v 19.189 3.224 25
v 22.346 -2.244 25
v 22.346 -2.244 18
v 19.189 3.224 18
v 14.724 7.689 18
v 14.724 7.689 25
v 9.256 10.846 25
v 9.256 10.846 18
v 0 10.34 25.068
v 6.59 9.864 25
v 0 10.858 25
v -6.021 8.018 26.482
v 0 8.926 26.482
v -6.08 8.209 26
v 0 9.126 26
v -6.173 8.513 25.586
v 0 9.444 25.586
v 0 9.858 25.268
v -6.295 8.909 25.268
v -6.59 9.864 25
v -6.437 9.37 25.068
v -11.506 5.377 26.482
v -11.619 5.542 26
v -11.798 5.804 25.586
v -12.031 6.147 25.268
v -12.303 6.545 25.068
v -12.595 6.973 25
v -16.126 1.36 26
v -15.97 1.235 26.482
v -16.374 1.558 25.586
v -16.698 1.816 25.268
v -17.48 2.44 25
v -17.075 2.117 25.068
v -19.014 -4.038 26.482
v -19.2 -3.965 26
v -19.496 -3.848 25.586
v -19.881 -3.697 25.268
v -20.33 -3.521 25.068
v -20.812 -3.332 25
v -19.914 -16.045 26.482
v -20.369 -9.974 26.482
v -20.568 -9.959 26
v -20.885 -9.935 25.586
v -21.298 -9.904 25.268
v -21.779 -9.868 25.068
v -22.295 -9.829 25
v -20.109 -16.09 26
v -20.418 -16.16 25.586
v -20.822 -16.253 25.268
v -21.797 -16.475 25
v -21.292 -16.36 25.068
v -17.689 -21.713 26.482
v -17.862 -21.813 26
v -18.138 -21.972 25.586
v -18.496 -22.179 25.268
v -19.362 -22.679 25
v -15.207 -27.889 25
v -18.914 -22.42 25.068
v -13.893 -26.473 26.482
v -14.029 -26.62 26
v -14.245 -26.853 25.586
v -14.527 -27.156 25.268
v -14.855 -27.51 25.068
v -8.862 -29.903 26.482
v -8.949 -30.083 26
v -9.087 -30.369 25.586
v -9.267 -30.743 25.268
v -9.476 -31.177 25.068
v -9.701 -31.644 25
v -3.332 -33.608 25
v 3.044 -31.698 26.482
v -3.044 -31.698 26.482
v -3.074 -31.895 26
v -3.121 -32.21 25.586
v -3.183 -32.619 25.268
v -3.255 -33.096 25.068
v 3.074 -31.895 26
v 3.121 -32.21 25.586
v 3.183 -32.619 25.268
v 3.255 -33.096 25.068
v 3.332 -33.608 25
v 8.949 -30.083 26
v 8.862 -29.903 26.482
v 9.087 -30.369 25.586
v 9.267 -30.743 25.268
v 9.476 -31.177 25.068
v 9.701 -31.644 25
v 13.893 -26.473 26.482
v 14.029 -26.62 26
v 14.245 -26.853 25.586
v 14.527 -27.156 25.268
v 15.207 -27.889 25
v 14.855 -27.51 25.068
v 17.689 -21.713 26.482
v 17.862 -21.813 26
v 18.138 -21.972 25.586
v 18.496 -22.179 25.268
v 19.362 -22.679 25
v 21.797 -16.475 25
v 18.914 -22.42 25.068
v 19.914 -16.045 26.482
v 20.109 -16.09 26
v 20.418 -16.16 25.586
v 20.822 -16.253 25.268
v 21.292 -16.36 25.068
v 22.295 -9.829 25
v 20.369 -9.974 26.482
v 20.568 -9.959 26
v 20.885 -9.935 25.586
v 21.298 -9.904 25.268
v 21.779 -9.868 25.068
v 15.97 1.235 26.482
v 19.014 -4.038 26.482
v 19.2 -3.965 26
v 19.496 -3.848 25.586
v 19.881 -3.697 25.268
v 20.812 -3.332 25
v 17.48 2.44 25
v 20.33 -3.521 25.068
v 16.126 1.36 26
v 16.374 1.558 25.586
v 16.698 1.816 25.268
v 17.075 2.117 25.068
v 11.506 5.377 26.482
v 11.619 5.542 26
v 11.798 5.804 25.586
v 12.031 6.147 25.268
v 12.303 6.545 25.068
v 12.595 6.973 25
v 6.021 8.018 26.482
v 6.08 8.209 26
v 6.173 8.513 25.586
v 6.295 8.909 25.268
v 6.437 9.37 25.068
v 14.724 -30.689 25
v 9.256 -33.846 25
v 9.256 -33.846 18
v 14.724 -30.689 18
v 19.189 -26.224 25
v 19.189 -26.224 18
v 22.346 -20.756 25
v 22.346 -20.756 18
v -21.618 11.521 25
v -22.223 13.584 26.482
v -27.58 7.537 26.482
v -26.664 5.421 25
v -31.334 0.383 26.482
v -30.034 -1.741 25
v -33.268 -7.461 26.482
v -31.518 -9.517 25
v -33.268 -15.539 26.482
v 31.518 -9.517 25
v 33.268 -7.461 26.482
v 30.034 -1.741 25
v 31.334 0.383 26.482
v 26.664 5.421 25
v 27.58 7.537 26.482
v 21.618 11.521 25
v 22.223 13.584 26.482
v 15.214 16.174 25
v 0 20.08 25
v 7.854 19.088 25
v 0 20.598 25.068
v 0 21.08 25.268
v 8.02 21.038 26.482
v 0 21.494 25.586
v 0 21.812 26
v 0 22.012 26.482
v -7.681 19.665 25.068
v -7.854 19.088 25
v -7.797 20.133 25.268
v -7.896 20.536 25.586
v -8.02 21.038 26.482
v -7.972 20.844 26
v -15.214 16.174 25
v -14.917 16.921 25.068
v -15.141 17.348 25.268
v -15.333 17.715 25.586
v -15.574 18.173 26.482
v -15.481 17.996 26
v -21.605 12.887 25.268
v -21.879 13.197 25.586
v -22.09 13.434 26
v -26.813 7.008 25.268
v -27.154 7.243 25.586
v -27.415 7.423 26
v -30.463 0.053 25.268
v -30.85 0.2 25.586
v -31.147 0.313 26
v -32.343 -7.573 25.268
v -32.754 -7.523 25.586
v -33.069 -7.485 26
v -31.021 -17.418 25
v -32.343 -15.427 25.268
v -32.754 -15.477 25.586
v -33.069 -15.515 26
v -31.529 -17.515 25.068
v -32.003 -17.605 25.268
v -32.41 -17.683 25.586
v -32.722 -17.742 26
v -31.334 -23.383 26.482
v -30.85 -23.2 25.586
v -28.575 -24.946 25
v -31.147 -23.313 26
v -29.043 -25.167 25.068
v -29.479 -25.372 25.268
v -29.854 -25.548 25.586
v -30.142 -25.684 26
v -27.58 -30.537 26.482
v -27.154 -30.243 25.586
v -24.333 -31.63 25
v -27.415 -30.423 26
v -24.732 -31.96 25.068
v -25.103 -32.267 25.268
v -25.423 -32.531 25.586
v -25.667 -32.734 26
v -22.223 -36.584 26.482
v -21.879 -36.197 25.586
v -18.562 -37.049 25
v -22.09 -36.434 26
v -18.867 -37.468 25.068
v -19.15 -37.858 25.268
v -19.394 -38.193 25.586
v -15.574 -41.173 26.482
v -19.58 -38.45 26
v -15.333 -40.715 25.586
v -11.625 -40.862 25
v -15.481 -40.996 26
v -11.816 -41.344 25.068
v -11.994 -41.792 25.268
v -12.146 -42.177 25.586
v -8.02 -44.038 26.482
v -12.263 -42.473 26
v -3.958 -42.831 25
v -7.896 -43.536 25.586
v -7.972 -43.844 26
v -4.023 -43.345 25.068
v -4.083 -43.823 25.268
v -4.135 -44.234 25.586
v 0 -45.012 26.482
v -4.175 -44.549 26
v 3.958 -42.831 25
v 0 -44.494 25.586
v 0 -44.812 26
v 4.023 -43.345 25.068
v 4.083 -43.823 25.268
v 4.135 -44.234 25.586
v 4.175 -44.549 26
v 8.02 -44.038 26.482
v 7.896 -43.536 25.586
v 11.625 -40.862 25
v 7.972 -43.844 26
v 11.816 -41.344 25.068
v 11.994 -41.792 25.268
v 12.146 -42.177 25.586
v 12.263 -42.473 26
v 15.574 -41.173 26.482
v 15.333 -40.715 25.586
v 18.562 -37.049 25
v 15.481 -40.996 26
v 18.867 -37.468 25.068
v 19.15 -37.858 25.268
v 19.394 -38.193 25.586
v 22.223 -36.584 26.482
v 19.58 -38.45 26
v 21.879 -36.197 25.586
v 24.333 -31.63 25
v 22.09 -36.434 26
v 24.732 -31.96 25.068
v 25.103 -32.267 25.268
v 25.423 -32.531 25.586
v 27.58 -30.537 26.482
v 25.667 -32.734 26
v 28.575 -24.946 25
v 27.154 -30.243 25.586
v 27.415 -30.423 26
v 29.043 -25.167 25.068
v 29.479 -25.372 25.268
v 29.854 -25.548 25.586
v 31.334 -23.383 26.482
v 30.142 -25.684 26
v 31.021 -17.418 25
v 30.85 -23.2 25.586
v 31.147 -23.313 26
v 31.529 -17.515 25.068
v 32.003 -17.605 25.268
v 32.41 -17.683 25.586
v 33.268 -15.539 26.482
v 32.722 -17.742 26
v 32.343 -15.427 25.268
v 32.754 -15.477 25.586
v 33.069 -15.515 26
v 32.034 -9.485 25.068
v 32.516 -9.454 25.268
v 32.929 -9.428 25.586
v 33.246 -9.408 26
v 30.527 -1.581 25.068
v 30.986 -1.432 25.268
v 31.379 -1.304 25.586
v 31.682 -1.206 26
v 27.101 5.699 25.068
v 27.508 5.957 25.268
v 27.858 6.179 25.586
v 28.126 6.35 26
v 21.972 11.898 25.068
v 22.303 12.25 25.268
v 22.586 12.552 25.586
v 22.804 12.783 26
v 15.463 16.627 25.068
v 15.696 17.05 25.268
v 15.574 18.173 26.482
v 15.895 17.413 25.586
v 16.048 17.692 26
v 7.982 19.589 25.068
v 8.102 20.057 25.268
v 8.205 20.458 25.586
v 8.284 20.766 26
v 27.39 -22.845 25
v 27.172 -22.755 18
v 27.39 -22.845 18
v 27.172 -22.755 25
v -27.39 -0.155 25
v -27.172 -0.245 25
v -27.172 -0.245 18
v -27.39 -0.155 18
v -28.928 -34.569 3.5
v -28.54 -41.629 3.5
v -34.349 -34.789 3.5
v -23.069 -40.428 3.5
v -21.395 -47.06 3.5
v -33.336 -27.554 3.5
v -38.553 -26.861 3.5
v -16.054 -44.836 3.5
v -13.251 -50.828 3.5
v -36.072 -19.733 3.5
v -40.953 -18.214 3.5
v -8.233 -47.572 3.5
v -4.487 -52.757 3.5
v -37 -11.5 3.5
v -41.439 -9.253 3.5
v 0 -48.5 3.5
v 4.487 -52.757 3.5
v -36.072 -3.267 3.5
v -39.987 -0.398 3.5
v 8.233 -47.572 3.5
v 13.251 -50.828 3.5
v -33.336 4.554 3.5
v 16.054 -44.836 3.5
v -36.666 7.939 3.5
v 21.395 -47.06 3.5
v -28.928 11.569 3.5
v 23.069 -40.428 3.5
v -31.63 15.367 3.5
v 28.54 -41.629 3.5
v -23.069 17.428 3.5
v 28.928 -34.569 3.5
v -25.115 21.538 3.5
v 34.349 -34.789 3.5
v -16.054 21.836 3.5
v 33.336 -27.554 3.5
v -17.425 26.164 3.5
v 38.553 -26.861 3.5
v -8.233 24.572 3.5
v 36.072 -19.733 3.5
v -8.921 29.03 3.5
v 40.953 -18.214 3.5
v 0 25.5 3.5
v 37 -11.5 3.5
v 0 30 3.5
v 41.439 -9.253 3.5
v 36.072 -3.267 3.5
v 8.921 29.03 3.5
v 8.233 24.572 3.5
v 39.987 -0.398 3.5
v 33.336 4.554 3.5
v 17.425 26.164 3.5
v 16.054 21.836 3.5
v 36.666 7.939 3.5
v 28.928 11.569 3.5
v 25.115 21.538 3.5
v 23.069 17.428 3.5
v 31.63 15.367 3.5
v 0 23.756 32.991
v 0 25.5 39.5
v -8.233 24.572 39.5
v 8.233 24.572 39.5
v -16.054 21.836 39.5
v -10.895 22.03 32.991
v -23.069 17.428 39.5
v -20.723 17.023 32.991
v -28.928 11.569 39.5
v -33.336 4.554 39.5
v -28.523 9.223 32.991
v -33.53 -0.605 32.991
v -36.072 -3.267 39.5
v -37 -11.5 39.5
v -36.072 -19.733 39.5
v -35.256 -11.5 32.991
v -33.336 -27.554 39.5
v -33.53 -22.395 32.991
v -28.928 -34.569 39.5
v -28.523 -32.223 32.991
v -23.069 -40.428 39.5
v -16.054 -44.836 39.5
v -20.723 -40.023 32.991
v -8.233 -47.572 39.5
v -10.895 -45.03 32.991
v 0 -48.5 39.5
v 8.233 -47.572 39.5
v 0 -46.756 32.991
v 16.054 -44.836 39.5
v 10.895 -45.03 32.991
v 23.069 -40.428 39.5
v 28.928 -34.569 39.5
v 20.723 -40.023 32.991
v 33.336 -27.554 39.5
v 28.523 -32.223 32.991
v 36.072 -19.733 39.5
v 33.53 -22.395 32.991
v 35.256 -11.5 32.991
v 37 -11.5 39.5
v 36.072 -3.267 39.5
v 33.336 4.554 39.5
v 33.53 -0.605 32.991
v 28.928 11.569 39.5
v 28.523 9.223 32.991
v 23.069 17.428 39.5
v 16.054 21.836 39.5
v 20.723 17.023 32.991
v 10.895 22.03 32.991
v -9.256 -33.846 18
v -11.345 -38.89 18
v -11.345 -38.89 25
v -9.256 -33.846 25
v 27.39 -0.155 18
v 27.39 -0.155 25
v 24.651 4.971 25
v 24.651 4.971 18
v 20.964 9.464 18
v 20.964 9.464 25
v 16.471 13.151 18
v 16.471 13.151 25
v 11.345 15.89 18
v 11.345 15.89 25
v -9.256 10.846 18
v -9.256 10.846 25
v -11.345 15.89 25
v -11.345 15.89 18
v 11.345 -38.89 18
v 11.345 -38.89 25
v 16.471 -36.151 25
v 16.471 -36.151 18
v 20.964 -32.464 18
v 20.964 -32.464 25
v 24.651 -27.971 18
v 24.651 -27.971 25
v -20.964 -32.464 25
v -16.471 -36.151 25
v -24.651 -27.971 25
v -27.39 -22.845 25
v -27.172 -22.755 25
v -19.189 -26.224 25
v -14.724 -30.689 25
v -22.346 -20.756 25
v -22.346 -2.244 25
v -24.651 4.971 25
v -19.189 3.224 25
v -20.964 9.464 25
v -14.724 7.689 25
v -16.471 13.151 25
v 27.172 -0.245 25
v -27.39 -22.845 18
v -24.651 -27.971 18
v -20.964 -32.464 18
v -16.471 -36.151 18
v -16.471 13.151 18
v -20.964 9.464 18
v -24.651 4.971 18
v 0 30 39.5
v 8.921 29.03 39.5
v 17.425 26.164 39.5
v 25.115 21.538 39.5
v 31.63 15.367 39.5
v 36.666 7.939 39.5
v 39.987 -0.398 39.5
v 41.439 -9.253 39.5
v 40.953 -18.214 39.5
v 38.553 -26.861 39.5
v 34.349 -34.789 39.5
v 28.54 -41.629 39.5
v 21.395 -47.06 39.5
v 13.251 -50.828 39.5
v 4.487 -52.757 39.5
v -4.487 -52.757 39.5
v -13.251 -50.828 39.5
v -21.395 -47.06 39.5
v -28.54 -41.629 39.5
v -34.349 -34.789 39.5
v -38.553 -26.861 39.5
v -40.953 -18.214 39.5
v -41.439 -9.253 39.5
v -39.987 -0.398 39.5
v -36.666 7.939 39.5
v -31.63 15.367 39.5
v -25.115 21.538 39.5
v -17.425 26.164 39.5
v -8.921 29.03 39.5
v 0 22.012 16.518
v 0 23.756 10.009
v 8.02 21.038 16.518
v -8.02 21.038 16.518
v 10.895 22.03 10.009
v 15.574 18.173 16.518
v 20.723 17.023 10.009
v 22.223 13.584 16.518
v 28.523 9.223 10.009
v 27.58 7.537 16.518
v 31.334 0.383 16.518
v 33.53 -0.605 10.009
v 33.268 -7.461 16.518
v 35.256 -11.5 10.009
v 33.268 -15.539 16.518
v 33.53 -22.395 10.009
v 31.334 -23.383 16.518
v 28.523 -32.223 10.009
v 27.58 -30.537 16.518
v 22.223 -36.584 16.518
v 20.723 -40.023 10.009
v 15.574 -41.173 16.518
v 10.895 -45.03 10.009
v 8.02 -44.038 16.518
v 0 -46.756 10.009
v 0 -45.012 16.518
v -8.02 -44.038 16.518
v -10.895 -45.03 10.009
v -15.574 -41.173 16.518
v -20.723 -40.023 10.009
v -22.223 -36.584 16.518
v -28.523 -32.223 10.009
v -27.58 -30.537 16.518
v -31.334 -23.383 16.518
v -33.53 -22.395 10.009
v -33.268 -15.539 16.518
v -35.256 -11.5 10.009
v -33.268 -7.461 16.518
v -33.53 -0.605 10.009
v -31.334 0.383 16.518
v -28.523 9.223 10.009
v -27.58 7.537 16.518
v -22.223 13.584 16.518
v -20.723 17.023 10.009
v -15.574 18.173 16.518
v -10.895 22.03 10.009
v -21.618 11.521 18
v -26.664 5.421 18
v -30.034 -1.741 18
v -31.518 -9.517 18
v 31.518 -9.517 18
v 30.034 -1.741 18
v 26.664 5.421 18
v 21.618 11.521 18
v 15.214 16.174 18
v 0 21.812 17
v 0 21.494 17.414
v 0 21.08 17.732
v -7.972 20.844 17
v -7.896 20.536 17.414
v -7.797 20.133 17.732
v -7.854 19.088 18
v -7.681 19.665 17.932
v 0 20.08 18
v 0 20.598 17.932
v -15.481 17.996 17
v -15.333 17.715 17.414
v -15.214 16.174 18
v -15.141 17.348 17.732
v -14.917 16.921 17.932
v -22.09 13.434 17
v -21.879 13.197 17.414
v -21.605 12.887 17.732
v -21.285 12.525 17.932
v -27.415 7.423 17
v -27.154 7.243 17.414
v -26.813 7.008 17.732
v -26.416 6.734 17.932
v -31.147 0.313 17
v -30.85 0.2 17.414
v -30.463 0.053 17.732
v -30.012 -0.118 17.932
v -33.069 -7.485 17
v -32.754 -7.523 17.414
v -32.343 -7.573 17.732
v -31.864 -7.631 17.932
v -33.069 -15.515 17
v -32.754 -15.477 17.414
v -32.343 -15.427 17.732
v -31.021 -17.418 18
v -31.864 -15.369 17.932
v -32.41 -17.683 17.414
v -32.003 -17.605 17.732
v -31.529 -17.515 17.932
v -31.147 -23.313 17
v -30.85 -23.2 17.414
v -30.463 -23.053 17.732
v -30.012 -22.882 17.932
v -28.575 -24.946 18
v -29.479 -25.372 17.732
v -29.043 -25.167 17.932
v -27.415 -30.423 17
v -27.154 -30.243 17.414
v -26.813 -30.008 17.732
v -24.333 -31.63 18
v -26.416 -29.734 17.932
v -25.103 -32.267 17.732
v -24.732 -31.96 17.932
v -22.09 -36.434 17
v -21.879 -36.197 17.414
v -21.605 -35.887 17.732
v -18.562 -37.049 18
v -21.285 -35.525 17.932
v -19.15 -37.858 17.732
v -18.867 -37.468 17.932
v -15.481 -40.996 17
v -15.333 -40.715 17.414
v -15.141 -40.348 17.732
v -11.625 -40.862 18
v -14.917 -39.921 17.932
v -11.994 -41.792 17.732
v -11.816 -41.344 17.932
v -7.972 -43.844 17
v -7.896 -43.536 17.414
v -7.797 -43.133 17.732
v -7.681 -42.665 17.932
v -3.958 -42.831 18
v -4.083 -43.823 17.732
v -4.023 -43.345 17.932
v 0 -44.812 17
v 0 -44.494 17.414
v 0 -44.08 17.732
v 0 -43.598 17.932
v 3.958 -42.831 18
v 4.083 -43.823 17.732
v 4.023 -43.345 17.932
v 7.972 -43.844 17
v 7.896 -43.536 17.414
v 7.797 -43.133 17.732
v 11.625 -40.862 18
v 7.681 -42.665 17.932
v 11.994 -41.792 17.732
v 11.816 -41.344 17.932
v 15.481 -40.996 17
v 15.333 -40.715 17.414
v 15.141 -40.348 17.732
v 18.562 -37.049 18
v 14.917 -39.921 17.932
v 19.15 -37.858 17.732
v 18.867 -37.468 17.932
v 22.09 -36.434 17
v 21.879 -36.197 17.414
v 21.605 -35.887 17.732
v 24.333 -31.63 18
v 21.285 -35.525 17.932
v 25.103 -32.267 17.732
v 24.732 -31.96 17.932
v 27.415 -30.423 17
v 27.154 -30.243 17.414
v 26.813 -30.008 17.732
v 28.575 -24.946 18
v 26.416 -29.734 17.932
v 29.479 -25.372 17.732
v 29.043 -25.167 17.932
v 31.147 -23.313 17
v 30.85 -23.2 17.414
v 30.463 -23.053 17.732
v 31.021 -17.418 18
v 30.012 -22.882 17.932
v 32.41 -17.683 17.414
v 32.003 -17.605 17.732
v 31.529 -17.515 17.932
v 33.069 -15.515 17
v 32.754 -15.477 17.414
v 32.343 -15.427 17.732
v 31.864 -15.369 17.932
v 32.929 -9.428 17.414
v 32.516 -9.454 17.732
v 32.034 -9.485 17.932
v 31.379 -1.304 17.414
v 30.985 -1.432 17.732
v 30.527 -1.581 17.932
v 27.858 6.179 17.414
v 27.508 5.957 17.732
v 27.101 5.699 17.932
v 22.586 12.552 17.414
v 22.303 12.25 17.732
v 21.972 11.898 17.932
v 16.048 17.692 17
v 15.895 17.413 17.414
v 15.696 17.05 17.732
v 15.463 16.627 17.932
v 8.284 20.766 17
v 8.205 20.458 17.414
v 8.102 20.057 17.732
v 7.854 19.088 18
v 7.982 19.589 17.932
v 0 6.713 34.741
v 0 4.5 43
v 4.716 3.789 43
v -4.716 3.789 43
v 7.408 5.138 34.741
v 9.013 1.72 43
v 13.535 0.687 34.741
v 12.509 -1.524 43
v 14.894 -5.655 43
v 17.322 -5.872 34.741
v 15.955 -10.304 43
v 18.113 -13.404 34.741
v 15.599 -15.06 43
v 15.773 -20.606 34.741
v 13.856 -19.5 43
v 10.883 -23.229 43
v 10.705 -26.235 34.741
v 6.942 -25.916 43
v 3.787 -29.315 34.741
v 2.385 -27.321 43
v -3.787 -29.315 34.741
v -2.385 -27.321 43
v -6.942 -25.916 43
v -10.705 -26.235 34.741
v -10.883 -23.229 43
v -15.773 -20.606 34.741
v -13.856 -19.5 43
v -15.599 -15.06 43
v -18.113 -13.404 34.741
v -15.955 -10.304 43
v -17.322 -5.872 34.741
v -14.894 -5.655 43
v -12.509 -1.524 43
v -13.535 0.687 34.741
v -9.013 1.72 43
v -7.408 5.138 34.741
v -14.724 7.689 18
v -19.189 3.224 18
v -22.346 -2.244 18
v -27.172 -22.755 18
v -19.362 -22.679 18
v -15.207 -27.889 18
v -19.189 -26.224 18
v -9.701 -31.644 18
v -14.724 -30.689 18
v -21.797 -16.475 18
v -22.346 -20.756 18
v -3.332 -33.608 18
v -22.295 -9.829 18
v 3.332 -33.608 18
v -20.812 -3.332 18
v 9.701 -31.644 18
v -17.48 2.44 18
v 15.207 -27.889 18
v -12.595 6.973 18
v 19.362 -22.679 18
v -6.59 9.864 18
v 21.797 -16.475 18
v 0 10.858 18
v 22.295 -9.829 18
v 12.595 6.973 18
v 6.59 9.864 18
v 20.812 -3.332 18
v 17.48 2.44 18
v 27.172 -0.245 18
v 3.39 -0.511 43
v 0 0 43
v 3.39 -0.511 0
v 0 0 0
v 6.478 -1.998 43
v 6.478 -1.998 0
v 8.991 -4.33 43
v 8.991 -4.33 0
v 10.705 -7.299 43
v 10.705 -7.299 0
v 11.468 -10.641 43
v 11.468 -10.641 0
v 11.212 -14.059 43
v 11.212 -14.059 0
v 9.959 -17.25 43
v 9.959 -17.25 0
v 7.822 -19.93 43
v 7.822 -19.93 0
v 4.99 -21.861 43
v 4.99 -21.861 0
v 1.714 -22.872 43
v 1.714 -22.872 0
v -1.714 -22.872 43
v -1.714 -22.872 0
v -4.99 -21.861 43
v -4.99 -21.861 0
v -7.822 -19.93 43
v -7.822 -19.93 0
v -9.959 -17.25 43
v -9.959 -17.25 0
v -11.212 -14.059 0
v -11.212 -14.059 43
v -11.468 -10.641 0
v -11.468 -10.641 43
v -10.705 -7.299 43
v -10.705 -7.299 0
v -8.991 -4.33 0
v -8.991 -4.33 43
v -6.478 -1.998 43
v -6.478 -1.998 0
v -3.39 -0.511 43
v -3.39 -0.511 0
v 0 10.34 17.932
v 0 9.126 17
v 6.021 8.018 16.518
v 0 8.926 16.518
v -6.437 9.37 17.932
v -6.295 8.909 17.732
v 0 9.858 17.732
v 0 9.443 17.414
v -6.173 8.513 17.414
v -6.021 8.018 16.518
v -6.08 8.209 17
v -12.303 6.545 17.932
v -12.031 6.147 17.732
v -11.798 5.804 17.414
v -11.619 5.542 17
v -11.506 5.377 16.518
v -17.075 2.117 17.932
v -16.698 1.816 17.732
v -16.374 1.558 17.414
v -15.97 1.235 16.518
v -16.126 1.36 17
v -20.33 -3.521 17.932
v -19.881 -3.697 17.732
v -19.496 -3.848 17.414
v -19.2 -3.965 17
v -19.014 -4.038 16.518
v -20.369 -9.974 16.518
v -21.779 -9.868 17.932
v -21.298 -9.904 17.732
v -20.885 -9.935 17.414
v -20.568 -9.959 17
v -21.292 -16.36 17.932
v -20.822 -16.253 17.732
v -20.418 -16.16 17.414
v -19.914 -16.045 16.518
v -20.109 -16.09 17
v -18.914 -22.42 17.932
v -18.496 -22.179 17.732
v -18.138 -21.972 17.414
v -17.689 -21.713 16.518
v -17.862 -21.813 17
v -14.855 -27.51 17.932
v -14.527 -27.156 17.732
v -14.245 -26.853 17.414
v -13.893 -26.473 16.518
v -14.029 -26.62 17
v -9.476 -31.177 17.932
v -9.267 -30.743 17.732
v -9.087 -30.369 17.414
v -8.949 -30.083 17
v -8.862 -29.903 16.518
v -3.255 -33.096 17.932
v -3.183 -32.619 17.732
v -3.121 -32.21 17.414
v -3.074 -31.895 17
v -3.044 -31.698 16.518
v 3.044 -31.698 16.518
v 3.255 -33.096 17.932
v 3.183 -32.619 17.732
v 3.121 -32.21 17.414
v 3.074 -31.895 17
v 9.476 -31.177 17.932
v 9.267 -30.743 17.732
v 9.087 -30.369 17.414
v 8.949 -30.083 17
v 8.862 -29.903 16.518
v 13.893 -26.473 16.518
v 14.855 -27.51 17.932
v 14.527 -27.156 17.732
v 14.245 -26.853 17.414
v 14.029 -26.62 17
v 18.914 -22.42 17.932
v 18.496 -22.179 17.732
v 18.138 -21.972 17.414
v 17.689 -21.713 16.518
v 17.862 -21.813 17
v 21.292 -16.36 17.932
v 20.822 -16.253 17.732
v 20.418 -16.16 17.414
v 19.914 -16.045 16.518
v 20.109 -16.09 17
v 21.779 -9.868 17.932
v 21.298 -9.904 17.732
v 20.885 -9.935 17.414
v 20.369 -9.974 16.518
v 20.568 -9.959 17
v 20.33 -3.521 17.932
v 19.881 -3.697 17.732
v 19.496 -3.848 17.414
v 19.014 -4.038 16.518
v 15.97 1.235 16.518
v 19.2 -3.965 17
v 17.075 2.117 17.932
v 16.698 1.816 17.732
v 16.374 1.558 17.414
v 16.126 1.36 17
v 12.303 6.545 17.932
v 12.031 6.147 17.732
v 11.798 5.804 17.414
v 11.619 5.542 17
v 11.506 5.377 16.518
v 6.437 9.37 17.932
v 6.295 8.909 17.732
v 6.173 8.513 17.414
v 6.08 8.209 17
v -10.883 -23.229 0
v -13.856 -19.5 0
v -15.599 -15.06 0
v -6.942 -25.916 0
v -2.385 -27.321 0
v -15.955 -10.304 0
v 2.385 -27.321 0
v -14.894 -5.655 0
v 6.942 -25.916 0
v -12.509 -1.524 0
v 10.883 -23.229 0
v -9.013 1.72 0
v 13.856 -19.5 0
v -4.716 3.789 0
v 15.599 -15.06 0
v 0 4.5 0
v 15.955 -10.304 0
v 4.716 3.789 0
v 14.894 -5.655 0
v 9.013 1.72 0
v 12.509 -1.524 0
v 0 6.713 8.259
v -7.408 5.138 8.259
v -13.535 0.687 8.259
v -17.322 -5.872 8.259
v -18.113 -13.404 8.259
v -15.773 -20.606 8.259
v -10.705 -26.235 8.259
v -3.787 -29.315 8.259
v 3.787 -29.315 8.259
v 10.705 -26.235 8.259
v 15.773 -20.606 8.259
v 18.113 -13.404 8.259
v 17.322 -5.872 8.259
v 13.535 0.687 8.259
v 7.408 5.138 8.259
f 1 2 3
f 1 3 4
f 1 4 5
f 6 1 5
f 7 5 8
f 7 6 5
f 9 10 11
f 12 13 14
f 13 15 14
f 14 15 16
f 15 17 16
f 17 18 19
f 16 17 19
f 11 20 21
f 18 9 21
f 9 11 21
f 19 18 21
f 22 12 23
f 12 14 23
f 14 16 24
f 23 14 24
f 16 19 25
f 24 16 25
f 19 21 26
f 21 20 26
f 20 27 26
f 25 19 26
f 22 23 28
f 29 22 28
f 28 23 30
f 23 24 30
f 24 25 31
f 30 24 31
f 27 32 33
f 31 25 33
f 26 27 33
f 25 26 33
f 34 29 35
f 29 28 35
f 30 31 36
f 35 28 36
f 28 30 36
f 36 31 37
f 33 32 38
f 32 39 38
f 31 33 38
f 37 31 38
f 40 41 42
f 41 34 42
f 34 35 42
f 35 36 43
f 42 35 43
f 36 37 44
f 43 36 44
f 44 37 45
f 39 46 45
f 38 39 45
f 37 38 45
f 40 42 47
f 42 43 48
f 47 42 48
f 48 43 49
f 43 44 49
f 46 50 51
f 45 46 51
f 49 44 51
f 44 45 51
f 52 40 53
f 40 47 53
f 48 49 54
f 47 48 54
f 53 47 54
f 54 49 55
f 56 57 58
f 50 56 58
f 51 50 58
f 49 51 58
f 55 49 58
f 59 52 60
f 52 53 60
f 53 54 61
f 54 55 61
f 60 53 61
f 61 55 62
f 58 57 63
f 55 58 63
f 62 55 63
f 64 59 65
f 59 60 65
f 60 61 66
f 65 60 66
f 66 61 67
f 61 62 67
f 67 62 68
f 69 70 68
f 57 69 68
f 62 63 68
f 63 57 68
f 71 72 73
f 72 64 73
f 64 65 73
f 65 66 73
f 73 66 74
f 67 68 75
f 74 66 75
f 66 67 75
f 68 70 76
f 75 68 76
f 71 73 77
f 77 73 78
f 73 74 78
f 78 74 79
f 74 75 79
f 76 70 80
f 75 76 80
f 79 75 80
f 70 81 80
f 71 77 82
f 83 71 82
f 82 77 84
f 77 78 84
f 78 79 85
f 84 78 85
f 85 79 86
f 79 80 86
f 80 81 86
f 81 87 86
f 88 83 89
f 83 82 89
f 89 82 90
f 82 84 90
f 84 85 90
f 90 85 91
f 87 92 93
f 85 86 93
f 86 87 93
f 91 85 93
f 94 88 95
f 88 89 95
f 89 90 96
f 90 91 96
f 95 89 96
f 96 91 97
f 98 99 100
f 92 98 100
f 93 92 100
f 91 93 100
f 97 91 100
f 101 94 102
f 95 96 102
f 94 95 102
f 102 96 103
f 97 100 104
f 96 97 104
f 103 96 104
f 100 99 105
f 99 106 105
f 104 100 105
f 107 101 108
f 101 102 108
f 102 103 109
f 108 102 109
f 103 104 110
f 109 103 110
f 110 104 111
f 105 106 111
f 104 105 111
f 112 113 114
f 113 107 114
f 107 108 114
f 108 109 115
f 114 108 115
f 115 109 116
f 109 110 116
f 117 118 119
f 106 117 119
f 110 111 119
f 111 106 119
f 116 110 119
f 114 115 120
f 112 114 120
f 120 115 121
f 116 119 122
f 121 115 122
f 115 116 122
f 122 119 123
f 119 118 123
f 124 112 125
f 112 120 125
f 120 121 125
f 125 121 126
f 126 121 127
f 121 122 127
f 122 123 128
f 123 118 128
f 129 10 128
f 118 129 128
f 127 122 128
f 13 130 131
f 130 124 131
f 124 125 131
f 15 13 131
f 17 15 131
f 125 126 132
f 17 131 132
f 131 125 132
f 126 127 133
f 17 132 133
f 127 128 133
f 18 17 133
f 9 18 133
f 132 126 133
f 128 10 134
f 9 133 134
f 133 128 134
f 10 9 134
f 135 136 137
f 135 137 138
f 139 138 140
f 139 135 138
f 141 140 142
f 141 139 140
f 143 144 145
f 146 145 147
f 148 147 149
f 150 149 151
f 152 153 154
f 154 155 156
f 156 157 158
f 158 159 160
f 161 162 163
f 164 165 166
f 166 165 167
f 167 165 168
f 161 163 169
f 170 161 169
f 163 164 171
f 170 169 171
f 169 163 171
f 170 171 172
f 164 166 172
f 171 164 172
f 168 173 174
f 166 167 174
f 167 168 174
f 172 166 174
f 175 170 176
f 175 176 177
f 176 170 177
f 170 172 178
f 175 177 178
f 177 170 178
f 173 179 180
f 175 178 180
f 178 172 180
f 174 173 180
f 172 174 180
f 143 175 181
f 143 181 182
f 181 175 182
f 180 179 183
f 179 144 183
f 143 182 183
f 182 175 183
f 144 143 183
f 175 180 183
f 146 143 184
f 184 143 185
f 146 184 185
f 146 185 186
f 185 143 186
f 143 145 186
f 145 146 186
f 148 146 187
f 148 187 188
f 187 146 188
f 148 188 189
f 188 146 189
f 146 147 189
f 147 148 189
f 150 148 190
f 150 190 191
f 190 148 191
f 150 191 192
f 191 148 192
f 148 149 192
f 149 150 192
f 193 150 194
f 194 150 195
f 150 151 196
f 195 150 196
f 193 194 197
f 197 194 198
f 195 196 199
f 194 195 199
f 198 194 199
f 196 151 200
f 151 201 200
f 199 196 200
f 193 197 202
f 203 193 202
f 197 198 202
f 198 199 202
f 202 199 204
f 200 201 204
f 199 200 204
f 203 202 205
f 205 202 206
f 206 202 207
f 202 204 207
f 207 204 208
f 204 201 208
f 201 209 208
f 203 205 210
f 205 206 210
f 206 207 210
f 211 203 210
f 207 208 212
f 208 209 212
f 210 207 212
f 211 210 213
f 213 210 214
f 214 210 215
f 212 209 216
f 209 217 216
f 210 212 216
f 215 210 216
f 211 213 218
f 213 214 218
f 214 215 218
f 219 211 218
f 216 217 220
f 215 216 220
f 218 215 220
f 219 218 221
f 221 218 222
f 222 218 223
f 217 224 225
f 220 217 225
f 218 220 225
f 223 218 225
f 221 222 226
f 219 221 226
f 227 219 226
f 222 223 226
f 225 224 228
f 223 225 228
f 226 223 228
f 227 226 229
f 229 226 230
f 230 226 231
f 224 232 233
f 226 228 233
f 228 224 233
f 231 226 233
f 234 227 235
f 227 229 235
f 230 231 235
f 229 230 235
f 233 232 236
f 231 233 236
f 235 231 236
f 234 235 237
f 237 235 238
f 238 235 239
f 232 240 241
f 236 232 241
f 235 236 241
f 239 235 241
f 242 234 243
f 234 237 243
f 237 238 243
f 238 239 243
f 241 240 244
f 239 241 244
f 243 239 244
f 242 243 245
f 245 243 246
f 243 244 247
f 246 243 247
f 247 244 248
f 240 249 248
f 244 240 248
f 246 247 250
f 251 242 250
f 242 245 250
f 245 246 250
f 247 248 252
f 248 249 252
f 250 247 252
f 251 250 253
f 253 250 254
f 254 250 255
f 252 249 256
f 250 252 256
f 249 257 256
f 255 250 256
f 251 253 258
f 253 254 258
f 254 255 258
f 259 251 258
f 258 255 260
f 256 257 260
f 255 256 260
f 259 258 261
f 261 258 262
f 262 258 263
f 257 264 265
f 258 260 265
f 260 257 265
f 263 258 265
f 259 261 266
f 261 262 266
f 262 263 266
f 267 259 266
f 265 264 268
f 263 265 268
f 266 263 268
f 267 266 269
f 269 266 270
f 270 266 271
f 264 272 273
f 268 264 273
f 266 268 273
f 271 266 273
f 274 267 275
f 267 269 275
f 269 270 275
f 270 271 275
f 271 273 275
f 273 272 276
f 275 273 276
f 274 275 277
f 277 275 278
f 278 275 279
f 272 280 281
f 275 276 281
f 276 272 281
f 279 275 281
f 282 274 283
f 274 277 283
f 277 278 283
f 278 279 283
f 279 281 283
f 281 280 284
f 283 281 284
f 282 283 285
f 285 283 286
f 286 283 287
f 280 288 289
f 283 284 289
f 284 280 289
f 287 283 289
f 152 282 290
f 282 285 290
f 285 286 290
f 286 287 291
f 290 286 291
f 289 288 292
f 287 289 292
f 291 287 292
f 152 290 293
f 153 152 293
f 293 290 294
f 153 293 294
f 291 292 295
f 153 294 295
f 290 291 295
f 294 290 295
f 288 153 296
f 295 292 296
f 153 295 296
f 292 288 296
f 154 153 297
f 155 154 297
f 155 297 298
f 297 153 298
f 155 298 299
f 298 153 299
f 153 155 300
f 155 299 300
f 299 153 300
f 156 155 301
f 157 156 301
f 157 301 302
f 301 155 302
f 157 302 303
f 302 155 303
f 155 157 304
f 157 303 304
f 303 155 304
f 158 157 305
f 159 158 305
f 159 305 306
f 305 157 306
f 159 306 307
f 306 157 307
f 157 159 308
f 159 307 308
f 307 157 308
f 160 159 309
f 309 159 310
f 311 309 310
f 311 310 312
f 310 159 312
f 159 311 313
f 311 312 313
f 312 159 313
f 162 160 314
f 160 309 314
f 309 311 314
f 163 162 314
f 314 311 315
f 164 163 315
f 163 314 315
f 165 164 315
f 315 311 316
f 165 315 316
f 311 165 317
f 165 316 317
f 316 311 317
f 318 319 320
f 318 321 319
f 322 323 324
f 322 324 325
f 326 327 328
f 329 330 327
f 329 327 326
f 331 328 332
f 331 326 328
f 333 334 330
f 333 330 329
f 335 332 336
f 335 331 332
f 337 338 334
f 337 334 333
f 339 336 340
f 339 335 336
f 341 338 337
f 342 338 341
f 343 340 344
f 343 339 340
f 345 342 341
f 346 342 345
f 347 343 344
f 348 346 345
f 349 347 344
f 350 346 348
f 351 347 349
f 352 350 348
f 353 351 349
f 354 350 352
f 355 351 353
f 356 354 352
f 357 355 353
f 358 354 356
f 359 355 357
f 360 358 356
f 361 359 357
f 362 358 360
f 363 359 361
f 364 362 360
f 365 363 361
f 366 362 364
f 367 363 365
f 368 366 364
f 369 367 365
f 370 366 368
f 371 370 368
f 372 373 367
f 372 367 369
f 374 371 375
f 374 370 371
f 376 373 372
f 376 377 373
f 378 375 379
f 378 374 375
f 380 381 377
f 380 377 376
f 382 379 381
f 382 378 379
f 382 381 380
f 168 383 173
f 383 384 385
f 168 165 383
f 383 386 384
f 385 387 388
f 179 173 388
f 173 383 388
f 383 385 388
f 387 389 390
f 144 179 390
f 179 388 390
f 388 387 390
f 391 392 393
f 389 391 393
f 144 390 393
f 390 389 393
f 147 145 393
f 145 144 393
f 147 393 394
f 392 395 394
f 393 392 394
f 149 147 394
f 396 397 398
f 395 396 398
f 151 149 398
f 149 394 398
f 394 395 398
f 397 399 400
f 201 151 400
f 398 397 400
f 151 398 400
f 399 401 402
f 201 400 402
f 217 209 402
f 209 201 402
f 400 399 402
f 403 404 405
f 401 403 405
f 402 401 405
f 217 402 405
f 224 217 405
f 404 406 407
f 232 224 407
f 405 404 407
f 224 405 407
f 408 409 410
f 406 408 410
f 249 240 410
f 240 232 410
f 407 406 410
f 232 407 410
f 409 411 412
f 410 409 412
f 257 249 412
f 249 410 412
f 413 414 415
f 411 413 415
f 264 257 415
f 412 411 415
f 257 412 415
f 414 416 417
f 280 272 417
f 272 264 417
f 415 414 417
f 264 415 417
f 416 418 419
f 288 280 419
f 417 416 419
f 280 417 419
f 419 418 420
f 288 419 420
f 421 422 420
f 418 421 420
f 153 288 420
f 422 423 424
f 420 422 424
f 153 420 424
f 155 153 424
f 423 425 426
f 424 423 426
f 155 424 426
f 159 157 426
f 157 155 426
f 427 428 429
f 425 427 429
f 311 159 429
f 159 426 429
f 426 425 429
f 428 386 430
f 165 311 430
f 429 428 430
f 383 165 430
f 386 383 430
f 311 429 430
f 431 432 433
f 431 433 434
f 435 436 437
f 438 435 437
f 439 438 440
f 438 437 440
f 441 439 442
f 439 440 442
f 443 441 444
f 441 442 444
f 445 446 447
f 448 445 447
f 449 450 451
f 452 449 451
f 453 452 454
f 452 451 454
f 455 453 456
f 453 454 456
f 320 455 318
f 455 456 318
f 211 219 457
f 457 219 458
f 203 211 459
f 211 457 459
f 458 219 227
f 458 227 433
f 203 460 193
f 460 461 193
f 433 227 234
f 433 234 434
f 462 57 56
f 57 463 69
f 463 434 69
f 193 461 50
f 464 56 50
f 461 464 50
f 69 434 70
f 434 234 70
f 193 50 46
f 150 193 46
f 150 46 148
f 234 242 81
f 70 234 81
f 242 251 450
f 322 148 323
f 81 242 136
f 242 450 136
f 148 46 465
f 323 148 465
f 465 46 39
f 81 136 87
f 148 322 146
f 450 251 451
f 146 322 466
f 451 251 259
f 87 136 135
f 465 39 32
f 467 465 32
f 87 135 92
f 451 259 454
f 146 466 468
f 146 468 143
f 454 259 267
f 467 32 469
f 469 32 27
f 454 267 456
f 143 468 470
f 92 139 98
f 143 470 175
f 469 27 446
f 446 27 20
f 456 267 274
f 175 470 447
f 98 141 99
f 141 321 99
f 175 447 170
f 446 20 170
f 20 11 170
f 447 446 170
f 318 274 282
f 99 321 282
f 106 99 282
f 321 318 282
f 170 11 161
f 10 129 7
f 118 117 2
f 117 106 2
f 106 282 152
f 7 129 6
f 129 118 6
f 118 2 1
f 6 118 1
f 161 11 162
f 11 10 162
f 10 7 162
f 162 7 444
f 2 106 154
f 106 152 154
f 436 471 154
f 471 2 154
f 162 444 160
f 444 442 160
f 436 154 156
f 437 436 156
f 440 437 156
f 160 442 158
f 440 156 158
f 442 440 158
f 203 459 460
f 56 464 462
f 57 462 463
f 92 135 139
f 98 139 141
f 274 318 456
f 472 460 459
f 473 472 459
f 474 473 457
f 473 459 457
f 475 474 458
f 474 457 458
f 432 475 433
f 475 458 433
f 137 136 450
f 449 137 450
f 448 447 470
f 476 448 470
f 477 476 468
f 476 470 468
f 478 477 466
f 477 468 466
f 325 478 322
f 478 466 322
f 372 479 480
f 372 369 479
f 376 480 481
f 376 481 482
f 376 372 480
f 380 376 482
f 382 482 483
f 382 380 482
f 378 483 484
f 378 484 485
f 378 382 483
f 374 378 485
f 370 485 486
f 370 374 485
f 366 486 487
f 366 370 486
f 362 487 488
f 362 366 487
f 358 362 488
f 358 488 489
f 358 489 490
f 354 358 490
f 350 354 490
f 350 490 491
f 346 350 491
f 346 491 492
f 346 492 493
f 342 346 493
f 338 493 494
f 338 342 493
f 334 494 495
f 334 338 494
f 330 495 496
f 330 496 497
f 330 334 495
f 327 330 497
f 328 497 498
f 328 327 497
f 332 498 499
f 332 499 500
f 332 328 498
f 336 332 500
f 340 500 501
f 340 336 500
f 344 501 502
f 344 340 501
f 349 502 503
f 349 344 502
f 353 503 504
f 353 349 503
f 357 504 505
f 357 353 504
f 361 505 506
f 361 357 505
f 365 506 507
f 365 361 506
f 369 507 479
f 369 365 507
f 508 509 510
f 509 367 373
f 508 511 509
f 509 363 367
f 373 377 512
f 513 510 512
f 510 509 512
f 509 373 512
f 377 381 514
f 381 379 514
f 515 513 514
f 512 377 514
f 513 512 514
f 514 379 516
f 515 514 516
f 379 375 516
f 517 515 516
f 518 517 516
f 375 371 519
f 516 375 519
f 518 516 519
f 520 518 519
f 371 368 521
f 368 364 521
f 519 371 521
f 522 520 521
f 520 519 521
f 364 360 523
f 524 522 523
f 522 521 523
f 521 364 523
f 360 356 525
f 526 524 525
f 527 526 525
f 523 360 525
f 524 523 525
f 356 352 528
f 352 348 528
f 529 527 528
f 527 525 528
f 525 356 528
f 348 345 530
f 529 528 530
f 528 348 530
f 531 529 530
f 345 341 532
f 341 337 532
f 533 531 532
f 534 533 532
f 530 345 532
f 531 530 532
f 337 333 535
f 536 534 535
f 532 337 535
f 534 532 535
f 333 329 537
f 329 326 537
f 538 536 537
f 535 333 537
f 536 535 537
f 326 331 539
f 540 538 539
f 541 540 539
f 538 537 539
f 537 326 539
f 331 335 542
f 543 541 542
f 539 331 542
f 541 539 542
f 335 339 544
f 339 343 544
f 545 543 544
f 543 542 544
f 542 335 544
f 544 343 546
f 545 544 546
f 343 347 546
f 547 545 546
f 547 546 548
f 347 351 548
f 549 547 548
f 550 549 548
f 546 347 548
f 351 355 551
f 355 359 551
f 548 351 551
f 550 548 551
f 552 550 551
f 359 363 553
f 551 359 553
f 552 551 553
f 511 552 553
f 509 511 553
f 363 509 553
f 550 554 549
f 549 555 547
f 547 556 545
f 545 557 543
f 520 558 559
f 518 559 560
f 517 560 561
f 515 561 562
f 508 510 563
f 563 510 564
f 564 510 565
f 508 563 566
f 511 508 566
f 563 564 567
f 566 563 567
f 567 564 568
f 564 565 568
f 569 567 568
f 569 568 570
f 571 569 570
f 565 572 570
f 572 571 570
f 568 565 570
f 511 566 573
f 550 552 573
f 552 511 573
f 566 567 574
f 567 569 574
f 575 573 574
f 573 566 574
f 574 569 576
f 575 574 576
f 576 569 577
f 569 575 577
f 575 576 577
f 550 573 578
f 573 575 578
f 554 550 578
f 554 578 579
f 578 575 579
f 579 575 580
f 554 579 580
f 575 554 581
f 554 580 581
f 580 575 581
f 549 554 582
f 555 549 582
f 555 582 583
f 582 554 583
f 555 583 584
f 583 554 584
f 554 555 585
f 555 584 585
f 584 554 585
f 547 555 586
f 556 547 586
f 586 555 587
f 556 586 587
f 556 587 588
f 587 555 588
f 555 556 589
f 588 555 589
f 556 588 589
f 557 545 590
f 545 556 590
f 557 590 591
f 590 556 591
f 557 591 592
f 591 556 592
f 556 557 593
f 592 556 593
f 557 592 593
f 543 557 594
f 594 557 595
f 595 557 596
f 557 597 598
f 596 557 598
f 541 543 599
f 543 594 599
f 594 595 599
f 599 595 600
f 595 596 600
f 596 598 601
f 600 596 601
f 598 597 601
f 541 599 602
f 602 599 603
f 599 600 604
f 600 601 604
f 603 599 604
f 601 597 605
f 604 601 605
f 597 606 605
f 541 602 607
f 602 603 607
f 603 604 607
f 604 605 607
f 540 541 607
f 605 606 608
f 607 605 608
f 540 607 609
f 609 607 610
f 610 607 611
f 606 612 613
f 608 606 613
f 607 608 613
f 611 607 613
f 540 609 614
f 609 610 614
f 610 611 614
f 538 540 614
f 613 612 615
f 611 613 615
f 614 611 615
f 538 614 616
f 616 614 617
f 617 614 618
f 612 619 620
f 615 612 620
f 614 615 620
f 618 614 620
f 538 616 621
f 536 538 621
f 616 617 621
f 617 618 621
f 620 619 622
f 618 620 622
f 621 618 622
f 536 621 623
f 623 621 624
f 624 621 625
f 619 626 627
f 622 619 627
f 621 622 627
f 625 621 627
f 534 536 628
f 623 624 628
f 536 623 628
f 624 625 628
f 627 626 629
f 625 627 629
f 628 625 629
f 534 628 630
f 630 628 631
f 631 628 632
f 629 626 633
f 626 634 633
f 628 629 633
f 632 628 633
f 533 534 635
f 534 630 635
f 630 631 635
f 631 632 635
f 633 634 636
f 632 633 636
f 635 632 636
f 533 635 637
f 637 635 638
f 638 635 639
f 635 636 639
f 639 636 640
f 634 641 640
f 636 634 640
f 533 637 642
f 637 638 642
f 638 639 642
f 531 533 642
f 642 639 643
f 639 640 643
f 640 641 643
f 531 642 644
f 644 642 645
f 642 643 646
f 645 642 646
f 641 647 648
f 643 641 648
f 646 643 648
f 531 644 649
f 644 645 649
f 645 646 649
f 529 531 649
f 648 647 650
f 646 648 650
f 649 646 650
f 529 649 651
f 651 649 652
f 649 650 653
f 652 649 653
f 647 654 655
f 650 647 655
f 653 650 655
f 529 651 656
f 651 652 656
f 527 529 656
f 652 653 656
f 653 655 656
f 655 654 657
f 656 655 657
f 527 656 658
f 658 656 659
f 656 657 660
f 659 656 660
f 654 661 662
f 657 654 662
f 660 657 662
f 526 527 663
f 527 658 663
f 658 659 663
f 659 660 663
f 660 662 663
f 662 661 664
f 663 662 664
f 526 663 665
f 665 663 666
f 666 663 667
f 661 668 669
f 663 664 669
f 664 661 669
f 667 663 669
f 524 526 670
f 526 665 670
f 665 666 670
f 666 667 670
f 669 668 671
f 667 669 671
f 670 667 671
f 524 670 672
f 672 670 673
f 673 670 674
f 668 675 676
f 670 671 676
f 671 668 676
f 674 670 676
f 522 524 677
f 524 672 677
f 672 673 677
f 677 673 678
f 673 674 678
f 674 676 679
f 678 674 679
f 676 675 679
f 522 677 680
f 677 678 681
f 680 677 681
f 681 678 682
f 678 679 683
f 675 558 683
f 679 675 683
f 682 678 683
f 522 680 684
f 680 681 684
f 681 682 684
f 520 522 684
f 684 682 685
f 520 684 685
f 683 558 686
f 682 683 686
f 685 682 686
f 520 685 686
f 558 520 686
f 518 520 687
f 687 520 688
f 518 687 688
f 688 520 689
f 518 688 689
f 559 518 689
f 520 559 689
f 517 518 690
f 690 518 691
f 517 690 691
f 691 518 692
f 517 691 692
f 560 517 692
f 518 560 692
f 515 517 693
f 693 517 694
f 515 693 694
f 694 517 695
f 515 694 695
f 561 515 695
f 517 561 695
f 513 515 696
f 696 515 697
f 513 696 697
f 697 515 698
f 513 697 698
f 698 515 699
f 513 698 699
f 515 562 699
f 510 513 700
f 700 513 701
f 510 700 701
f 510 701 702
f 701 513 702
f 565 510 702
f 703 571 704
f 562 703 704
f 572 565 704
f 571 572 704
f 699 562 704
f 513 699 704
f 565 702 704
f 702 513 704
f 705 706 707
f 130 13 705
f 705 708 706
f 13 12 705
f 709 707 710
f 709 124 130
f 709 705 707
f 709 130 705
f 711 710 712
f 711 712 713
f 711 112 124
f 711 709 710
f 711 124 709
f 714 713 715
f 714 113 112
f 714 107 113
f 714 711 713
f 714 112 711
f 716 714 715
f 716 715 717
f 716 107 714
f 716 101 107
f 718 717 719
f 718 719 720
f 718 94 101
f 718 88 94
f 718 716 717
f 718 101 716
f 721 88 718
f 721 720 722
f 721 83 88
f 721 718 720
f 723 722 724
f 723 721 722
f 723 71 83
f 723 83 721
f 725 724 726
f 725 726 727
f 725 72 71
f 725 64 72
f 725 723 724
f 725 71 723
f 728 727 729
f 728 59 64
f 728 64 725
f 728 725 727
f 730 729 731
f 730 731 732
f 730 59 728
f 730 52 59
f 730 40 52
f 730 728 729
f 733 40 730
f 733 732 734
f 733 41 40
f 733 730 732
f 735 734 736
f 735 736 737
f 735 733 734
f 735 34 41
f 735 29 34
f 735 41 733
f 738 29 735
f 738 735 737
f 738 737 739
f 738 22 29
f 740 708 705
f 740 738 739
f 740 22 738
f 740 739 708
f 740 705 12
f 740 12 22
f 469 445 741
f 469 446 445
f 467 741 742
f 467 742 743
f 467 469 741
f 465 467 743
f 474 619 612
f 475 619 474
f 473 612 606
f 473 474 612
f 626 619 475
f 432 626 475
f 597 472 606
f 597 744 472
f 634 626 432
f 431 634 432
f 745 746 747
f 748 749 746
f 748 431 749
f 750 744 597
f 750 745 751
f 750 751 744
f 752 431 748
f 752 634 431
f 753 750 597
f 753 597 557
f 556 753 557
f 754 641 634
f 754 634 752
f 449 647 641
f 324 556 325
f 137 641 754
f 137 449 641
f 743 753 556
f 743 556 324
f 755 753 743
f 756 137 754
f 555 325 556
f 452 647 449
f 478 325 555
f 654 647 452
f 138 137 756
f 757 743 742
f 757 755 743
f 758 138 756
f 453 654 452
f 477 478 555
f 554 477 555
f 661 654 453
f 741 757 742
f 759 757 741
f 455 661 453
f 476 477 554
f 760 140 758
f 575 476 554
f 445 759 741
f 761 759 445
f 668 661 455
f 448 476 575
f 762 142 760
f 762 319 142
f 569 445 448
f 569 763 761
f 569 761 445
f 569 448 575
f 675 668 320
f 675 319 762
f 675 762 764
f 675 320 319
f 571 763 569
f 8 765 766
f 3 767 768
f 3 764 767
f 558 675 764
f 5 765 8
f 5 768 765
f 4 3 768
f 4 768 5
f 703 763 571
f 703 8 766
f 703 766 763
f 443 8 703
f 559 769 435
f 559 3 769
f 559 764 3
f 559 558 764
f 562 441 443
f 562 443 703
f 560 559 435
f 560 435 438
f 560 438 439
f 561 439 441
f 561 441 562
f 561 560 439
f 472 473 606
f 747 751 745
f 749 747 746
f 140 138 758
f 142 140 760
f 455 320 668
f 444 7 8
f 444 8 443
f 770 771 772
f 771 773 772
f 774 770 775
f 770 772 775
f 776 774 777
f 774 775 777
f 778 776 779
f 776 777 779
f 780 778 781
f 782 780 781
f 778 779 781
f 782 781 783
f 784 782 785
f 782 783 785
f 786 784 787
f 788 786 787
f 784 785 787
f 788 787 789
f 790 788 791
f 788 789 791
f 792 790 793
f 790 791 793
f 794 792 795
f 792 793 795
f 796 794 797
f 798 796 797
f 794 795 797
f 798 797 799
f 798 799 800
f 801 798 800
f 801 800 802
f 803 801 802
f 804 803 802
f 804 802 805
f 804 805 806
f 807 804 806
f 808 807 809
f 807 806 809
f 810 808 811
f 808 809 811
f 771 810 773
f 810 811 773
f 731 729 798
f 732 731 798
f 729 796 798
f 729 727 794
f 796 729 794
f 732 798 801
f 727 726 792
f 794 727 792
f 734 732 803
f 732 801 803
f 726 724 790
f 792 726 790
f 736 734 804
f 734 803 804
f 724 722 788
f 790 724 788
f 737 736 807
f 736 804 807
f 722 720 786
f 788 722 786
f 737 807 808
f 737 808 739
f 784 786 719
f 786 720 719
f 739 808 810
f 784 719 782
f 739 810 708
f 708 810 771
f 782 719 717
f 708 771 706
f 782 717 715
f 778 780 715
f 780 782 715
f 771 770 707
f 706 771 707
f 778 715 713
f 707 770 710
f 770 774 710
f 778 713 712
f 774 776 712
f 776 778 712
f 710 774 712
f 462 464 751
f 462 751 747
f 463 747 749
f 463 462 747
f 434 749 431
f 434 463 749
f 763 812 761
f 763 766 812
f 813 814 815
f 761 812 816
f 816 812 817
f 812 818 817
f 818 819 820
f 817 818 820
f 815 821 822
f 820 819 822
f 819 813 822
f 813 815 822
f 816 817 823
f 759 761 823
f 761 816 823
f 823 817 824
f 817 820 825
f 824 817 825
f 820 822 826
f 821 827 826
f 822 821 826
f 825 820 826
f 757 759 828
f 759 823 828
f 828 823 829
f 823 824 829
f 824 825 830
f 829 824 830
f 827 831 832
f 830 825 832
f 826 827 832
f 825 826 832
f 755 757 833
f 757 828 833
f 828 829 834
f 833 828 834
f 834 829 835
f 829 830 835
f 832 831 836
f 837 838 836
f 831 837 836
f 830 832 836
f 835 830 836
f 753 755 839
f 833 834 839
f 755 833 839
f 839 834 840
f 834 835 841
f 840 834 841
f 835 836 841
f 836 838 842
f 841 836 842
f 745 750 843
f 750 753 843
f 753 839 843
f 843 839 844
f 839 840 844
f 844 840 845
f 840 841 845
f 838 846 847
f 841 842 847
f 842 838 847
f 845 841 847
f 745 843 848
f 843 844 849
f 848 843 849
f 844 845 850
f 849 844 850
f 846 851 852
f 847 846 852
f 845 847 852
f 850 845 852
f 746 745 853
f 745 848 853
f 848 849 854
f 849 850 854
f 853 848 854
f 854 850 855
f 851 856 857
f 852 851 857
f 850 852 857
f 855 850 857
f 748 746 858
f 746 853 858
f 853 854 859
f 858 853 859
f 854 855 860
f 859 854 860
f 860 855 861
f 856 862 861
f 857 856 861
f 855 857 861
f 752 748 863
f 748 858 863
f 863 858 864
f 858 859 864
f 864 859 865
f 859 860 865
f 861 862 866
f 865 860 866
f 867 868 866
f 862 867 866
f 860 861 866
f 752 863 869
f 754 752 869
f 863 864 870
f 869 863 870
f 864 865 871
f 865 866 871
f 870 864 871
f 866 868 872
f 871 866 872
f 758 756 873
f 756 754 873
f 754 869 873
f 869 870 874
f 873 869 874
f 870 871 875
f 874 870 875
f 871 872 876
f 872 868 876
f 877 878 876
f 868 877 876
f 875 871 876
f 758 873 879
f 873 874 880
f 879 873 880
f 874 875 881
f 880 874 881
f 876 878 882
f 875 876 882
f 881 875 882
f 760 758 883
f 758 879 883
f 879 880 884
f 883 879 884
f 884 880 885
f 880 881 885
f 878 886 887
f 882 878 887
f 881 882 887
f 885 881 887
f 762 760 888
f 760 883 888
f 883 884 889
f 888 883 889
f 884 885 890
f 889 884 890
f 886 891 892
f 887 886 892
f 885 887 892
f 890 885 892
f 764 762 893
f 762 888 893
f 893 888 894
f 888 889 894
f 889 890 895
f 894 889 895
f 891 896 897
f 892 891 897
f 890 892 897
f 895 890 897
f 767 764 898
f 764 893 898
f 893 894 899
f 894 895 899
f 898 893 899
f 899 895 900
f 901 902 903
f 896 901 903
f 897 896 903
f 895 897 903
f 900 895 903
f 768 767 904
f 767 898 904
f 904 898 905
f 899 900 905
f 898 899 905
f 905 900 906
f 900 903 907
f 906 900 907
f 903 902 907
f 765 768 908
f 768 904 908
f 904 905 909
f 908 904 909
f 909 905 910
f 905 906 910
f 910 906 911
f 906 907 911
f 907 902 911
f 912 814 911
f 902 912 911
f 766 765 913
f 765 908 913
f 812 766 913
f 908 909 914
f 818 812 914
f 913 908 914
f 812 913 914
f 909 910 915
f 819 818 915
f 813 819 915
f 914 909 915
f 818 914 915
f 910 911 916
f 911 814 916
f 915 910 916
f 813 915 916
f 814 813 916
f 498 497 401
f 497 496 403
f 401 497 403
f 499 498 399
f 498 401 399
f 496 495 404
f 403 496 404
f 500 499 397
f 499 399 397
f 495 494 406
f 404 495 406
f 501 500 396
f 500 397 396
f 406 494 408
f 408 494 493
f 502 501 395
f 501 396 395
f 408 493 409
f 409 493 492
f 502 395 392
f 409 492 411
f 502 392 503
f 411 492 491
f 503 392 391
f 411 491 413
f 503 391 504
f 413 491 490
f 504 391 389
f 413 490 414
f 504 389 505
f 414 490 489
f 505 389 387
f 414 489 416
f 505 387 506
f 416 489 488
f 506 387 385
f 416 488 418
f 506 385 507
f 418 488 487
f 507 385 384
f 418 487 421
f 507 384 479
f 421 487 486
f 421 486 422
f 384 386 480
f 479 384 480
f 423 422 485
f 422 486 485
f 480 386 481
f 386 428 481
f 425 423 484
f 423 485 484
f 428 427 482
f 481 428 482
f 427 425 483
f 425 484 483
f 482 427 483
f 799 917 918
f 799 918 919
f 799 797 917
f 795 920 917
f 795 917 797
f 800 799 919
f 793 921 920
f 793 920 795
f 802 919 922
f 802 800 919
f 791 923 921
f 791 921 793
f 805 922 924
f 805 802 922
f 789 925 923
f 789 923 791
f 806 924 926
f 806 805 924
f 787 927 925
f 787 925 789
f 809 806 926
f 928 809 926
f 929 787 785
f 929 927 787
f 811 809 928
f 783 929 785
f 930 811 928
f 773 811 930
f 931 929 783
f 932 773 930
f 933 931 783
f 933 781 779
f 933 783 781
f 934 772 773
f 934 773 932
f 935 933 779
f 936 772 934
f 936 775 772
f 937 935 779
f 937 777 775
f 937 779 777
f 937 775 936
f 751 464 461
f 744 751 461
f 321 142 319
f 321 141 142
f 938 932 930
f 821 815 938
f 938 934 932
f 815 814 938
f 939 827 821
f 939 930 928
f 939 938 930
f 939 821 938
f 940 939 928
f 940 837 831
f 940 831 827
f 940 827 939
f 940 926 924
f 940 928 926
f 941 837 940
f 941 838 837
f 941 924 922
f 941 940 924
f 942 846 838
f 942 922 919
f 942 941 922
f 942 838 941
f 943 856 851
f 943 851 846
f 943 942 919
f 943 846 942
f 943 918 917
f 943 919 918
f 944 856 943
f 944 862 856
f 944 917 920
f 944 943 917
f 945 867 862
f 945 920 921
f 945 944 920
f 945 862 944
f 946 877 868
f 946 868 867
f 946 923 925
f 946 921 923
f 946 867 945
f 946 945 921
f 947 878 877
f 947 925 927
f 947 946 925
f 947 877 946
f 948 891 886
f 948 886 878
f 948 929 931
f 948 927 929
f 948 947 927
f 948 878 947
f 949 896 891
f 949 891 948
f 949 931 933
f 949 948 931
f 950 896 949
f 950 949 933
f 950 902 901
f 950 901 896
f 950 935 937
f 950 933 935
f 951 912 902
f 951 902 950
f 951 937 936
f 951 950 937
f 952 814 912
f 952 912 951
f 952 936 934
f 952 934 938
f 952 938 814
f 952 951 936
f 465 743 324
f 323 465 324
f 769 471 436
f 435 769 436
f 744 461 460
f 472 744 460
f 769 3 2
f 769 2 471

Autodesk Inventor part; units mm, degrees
ref_plane "YZ Plane" through (0, 0, 0) normal (1, 0, 0) x (0, 1, 0)
ref_plane "XZ Plane" through (0, 0, 0) normal (0, 1, 0) x (-1, 0, 0)
sketch "Sketch1" plane through (0, 0, 0) normal (1, 0, 0) x (0, 1, 0)
  line L0 (0, 0) -> (4.5, 0)
  line L1 (4.5, 0) -> (4.5, 43)
  line L2 (4.5, 43) -> (0, 43)
  line L3 (0, 43) -> (0, 0)
  line L4 (4.5, 43) -> (8.9259, 26.4824)
  line L5 (4.5, 21.5) -> (10.3528, 21.5)
  line L6 (13, 25) -> (10.8577, 25)
  line L7 (25.5, 39.5) -> (30, 39.5)
  line L8 (30, 39.5) -> (30, 3.5)
  line L9 (30, 3.5) -> (25.5, 3.5)
  line L10 (25.5, 3.5) -> (25.5, 39.5)
  line L11 (25.5, 39.5) -> (22.0119, 26.4824)
  line L12 (10.8577, 18) -> (20.0801, 18)
  line L13 (4.5, 0) -> (8.9259, 16.5176)
  line L14 (25.5, 3.5) -> (22.0119, 16.5176)
  line L15 (3, 25) -> (20.0801, 25)
  arc A0 (8.9259, 26.4824) -> (10.8577, 25) centre (10.8577, 27) ccw
  arc A1 (20.0801, 25) -> (22.0119, 26.4824) centre (20.0801, 27) ccw
  arc A2 (22.0119, 16.5176) -> (20.0801, 18) centre (20.0801, 16) ccw
  arc A3 (10.8577, 18) -> (8.9259, 16.5176) centre (10.8577, 16) ccw
  line L16 (-11.5, 16.5176) -> (-11.5, 3.5)
  point P0 (9.6974, 23.6032)
  point P1 (21.6069, 24.9709)
  point P2 (3, 18)
  point P3 (23.25, 18)
  point P4 (9.6974, 19.3968)
  point P5 (21.6069, 18.0291)
  point P6 (23.25, 25)
  dimension "d0" = 43
  dimension "d1" = 4.5
  dimension "d2" = 15
  dimension "d3" = 21.5
  dimension "d4" = 3.5
  dimension "d5" = 4.5
  dimension "d6" = 36
  dimension "d7" = 18
  dimension "d8" = 15
  dimension "d9" = 3.5
  dimension "d10" = 30
  dimension "d11" = 2
  dimension "d12" = 32
revolve "Revolution1" add sketch "Sketch1" angle 360 about axis through (0, -11.5, 16.5176) along (0, 0, -1)
ref_plane "Work Plane1" through (0, -11.5, 75) normal (0, 0, 1) x (1, 0, 0)
sketch "Sketch2" plane through (0, -11.5, 75) normal (0, 0, 1) x (1, 0, 0)
  line L0 (9.2559, 22.3457) -> (12.1824, 29.4109)
  line L1 (22.3457, 9.2559) -> (27.1721, 11.2551)
  line L2 (0, 0) -> (0, 29.4109)
  line L3 (0, 0) -> (29.4109, 0)
  arc A0 (27.3903, 11.3454) -> (11.3454, 27.3903) centre (0, 0) ccw
  line L4 (22.3457, 9.2559) -> (27.1721, 11.2551)
  line L5 (22.3457, 9.2559) -> (27.3903, 11.3454)
  line L6 (22.3457, 9.2559) -> (27.3903, 11.3454)
  arc A1 (22.3457, 9.2559) -> (9.2559, 22.3457) centre (0, 0) ccw
  arc A2 (0, 24.1868) -> (24.1868, 0) centre (0, 0) ccw
  line L7 (11.3454, 27.3903) -> (9.2559, 22.3457)
  line L8 (27.3903, 11.3454) -> (22.3457, 9.2559)
  arc A3 (22.3457, 9.2559) -> (9.2559, 22.3457) centre (0, 0) ccw
  arc A4 (27.3903, 11.3454) -> (11.3454, 27.3903) centre (0, 0) ccw
  line L9 (9.2559, -22.3457) -> (12.1824, -29.4109)
  line L10 (22.3457, -9.2559) -> (27.1721, -11.2551)
  arc A5 (11.3454, -27.3903) -> (27.3903, -11.3454) centre (0, 0) ccw
  line L11 (22.3457, -9.2559) -> (27.1721, -11.2551)
  line L12 (22.3457, -9.2559) -> (27.3903, -11.3454)
  line L13 (22.3457, -9.2559) -> (27.3903, -11.3454)
  arc A6 (9.2559, -22.3457) -> (22.3457, -9.2559) centre (0, 0) ccw
  line L14 (11.3454, -27.3903) -> (9.2559, -22.3457)
  line L15 (27.3903, -11.3454) -> (22.3457, -9.2559)
  arc A7 (9.2559, -22.3457) -> (22.3457, -9.2559) centre (0, 0) ccw
  arc A8 (11.3454, -27.3903) -> (27.3903, -11.3454) centre (0, 0) ccw
  line L16 (0, 0) -> (0, -24.1868)
  line L17 (-9.2559, 22.3457) -> (-12.1824, 29.4109)
  line L18 (-22.3457, 9.2559) -> (-27.1721, 11.2551)
  arc A9 (-11.3454, 27.3903) -> (-27.3903, 11.3454) centre (0, 0) ccw
  line L19 (-22.3457, 9.2559) -> (-27.1721, 11.2551)
  line L20 (-22.3457, 9.2559) -> (-27.3903, 11.3454)
  line L21 (-22.3457, 9.2559) -> (-27.3903, 11.3454)
  arc A10 (-9.2559, 22.3457) -> (-22.3457, 9.2559) centre (0, 0) ccw
  line L22 (-11.3454, 27.3903) -> (-9.2559, 22.3457)
  line L23 (-27.3903, 11.3454) -> (-22.3457, 9.2559)
  arc A11 (-9.2559, 22.3457) -> (-22.3457, 9.2559) centre (0, 0) ccw
  arc A12 (-11.3454, 27.3903) -> (-27.3903, 11.3454) centre (0, 0) ccw
  line L24 (-22.3457, -9.2559) -> (-27.1721, -11.2551)
  line L25 (-22.3457, -9.2559) -> (-27.1721, -11.2551)
  line L26 (-22.3457, -9.2559) -> (-27.3903, -11.3454)
  line L27 (-22.3457, -9.2559) -> (-27.3903, -11.3454)
  line L28 (-27.3903, -11.3454) -> (-22.3457, -9.2559)
  arc A13 (-22.3457, -9.2559) -> (-9.2559, -22.3457) centre (0, 0) ccw
  arc A14 (-22.3457, -9.2559) -> (-9.2559, -22.3457) centre (0, 0) ccw
  arc A15 (-27.3903, -11.3454) -> (-11.3454, -27.3903) centre (0, 0) ccw
  line L29 (-11.3454, -27.3903) -> (-9.2559, -22.3457)
  line L30 (-9.2559, -22.3457) -> (-12.1824, -29.4109)
  arc A16 (-27.3903, -11.3454) -> (-11.3454, -27.3903) centre (0, 0) ccw
  point P0 (0, 11.5)
  point P1 (-29.4109, 0)
  point P2 (-24.1868, 0)
  point P3 (-9.2559, 22.3457)
  point P4 (9.2559, -22.3457)
  point P5 (27.1721, -11.2551)
  point P6 (22.3457, -9.2559)
  point P7 (-22.3457, -9.2559)
  point P8 (-27.1721, -11.2551)
  dimension "d15" = 29.4109
  dimension "d16" = 22.5
  dimension "d17" = 22.5
extrude "Extrusion1" cut sketch "Sketch2" against normal through all contours L0 A0 L5 L1 A1 | A2 L18 L20 A9 L17 | L10 L12 A5 L9 A2 | L29 A15 L26 L24 A2
equation "\"d3\" = 0.5 * d0"
equation "\"d7\" = 0.5 * d6"
properties part number "roller"
